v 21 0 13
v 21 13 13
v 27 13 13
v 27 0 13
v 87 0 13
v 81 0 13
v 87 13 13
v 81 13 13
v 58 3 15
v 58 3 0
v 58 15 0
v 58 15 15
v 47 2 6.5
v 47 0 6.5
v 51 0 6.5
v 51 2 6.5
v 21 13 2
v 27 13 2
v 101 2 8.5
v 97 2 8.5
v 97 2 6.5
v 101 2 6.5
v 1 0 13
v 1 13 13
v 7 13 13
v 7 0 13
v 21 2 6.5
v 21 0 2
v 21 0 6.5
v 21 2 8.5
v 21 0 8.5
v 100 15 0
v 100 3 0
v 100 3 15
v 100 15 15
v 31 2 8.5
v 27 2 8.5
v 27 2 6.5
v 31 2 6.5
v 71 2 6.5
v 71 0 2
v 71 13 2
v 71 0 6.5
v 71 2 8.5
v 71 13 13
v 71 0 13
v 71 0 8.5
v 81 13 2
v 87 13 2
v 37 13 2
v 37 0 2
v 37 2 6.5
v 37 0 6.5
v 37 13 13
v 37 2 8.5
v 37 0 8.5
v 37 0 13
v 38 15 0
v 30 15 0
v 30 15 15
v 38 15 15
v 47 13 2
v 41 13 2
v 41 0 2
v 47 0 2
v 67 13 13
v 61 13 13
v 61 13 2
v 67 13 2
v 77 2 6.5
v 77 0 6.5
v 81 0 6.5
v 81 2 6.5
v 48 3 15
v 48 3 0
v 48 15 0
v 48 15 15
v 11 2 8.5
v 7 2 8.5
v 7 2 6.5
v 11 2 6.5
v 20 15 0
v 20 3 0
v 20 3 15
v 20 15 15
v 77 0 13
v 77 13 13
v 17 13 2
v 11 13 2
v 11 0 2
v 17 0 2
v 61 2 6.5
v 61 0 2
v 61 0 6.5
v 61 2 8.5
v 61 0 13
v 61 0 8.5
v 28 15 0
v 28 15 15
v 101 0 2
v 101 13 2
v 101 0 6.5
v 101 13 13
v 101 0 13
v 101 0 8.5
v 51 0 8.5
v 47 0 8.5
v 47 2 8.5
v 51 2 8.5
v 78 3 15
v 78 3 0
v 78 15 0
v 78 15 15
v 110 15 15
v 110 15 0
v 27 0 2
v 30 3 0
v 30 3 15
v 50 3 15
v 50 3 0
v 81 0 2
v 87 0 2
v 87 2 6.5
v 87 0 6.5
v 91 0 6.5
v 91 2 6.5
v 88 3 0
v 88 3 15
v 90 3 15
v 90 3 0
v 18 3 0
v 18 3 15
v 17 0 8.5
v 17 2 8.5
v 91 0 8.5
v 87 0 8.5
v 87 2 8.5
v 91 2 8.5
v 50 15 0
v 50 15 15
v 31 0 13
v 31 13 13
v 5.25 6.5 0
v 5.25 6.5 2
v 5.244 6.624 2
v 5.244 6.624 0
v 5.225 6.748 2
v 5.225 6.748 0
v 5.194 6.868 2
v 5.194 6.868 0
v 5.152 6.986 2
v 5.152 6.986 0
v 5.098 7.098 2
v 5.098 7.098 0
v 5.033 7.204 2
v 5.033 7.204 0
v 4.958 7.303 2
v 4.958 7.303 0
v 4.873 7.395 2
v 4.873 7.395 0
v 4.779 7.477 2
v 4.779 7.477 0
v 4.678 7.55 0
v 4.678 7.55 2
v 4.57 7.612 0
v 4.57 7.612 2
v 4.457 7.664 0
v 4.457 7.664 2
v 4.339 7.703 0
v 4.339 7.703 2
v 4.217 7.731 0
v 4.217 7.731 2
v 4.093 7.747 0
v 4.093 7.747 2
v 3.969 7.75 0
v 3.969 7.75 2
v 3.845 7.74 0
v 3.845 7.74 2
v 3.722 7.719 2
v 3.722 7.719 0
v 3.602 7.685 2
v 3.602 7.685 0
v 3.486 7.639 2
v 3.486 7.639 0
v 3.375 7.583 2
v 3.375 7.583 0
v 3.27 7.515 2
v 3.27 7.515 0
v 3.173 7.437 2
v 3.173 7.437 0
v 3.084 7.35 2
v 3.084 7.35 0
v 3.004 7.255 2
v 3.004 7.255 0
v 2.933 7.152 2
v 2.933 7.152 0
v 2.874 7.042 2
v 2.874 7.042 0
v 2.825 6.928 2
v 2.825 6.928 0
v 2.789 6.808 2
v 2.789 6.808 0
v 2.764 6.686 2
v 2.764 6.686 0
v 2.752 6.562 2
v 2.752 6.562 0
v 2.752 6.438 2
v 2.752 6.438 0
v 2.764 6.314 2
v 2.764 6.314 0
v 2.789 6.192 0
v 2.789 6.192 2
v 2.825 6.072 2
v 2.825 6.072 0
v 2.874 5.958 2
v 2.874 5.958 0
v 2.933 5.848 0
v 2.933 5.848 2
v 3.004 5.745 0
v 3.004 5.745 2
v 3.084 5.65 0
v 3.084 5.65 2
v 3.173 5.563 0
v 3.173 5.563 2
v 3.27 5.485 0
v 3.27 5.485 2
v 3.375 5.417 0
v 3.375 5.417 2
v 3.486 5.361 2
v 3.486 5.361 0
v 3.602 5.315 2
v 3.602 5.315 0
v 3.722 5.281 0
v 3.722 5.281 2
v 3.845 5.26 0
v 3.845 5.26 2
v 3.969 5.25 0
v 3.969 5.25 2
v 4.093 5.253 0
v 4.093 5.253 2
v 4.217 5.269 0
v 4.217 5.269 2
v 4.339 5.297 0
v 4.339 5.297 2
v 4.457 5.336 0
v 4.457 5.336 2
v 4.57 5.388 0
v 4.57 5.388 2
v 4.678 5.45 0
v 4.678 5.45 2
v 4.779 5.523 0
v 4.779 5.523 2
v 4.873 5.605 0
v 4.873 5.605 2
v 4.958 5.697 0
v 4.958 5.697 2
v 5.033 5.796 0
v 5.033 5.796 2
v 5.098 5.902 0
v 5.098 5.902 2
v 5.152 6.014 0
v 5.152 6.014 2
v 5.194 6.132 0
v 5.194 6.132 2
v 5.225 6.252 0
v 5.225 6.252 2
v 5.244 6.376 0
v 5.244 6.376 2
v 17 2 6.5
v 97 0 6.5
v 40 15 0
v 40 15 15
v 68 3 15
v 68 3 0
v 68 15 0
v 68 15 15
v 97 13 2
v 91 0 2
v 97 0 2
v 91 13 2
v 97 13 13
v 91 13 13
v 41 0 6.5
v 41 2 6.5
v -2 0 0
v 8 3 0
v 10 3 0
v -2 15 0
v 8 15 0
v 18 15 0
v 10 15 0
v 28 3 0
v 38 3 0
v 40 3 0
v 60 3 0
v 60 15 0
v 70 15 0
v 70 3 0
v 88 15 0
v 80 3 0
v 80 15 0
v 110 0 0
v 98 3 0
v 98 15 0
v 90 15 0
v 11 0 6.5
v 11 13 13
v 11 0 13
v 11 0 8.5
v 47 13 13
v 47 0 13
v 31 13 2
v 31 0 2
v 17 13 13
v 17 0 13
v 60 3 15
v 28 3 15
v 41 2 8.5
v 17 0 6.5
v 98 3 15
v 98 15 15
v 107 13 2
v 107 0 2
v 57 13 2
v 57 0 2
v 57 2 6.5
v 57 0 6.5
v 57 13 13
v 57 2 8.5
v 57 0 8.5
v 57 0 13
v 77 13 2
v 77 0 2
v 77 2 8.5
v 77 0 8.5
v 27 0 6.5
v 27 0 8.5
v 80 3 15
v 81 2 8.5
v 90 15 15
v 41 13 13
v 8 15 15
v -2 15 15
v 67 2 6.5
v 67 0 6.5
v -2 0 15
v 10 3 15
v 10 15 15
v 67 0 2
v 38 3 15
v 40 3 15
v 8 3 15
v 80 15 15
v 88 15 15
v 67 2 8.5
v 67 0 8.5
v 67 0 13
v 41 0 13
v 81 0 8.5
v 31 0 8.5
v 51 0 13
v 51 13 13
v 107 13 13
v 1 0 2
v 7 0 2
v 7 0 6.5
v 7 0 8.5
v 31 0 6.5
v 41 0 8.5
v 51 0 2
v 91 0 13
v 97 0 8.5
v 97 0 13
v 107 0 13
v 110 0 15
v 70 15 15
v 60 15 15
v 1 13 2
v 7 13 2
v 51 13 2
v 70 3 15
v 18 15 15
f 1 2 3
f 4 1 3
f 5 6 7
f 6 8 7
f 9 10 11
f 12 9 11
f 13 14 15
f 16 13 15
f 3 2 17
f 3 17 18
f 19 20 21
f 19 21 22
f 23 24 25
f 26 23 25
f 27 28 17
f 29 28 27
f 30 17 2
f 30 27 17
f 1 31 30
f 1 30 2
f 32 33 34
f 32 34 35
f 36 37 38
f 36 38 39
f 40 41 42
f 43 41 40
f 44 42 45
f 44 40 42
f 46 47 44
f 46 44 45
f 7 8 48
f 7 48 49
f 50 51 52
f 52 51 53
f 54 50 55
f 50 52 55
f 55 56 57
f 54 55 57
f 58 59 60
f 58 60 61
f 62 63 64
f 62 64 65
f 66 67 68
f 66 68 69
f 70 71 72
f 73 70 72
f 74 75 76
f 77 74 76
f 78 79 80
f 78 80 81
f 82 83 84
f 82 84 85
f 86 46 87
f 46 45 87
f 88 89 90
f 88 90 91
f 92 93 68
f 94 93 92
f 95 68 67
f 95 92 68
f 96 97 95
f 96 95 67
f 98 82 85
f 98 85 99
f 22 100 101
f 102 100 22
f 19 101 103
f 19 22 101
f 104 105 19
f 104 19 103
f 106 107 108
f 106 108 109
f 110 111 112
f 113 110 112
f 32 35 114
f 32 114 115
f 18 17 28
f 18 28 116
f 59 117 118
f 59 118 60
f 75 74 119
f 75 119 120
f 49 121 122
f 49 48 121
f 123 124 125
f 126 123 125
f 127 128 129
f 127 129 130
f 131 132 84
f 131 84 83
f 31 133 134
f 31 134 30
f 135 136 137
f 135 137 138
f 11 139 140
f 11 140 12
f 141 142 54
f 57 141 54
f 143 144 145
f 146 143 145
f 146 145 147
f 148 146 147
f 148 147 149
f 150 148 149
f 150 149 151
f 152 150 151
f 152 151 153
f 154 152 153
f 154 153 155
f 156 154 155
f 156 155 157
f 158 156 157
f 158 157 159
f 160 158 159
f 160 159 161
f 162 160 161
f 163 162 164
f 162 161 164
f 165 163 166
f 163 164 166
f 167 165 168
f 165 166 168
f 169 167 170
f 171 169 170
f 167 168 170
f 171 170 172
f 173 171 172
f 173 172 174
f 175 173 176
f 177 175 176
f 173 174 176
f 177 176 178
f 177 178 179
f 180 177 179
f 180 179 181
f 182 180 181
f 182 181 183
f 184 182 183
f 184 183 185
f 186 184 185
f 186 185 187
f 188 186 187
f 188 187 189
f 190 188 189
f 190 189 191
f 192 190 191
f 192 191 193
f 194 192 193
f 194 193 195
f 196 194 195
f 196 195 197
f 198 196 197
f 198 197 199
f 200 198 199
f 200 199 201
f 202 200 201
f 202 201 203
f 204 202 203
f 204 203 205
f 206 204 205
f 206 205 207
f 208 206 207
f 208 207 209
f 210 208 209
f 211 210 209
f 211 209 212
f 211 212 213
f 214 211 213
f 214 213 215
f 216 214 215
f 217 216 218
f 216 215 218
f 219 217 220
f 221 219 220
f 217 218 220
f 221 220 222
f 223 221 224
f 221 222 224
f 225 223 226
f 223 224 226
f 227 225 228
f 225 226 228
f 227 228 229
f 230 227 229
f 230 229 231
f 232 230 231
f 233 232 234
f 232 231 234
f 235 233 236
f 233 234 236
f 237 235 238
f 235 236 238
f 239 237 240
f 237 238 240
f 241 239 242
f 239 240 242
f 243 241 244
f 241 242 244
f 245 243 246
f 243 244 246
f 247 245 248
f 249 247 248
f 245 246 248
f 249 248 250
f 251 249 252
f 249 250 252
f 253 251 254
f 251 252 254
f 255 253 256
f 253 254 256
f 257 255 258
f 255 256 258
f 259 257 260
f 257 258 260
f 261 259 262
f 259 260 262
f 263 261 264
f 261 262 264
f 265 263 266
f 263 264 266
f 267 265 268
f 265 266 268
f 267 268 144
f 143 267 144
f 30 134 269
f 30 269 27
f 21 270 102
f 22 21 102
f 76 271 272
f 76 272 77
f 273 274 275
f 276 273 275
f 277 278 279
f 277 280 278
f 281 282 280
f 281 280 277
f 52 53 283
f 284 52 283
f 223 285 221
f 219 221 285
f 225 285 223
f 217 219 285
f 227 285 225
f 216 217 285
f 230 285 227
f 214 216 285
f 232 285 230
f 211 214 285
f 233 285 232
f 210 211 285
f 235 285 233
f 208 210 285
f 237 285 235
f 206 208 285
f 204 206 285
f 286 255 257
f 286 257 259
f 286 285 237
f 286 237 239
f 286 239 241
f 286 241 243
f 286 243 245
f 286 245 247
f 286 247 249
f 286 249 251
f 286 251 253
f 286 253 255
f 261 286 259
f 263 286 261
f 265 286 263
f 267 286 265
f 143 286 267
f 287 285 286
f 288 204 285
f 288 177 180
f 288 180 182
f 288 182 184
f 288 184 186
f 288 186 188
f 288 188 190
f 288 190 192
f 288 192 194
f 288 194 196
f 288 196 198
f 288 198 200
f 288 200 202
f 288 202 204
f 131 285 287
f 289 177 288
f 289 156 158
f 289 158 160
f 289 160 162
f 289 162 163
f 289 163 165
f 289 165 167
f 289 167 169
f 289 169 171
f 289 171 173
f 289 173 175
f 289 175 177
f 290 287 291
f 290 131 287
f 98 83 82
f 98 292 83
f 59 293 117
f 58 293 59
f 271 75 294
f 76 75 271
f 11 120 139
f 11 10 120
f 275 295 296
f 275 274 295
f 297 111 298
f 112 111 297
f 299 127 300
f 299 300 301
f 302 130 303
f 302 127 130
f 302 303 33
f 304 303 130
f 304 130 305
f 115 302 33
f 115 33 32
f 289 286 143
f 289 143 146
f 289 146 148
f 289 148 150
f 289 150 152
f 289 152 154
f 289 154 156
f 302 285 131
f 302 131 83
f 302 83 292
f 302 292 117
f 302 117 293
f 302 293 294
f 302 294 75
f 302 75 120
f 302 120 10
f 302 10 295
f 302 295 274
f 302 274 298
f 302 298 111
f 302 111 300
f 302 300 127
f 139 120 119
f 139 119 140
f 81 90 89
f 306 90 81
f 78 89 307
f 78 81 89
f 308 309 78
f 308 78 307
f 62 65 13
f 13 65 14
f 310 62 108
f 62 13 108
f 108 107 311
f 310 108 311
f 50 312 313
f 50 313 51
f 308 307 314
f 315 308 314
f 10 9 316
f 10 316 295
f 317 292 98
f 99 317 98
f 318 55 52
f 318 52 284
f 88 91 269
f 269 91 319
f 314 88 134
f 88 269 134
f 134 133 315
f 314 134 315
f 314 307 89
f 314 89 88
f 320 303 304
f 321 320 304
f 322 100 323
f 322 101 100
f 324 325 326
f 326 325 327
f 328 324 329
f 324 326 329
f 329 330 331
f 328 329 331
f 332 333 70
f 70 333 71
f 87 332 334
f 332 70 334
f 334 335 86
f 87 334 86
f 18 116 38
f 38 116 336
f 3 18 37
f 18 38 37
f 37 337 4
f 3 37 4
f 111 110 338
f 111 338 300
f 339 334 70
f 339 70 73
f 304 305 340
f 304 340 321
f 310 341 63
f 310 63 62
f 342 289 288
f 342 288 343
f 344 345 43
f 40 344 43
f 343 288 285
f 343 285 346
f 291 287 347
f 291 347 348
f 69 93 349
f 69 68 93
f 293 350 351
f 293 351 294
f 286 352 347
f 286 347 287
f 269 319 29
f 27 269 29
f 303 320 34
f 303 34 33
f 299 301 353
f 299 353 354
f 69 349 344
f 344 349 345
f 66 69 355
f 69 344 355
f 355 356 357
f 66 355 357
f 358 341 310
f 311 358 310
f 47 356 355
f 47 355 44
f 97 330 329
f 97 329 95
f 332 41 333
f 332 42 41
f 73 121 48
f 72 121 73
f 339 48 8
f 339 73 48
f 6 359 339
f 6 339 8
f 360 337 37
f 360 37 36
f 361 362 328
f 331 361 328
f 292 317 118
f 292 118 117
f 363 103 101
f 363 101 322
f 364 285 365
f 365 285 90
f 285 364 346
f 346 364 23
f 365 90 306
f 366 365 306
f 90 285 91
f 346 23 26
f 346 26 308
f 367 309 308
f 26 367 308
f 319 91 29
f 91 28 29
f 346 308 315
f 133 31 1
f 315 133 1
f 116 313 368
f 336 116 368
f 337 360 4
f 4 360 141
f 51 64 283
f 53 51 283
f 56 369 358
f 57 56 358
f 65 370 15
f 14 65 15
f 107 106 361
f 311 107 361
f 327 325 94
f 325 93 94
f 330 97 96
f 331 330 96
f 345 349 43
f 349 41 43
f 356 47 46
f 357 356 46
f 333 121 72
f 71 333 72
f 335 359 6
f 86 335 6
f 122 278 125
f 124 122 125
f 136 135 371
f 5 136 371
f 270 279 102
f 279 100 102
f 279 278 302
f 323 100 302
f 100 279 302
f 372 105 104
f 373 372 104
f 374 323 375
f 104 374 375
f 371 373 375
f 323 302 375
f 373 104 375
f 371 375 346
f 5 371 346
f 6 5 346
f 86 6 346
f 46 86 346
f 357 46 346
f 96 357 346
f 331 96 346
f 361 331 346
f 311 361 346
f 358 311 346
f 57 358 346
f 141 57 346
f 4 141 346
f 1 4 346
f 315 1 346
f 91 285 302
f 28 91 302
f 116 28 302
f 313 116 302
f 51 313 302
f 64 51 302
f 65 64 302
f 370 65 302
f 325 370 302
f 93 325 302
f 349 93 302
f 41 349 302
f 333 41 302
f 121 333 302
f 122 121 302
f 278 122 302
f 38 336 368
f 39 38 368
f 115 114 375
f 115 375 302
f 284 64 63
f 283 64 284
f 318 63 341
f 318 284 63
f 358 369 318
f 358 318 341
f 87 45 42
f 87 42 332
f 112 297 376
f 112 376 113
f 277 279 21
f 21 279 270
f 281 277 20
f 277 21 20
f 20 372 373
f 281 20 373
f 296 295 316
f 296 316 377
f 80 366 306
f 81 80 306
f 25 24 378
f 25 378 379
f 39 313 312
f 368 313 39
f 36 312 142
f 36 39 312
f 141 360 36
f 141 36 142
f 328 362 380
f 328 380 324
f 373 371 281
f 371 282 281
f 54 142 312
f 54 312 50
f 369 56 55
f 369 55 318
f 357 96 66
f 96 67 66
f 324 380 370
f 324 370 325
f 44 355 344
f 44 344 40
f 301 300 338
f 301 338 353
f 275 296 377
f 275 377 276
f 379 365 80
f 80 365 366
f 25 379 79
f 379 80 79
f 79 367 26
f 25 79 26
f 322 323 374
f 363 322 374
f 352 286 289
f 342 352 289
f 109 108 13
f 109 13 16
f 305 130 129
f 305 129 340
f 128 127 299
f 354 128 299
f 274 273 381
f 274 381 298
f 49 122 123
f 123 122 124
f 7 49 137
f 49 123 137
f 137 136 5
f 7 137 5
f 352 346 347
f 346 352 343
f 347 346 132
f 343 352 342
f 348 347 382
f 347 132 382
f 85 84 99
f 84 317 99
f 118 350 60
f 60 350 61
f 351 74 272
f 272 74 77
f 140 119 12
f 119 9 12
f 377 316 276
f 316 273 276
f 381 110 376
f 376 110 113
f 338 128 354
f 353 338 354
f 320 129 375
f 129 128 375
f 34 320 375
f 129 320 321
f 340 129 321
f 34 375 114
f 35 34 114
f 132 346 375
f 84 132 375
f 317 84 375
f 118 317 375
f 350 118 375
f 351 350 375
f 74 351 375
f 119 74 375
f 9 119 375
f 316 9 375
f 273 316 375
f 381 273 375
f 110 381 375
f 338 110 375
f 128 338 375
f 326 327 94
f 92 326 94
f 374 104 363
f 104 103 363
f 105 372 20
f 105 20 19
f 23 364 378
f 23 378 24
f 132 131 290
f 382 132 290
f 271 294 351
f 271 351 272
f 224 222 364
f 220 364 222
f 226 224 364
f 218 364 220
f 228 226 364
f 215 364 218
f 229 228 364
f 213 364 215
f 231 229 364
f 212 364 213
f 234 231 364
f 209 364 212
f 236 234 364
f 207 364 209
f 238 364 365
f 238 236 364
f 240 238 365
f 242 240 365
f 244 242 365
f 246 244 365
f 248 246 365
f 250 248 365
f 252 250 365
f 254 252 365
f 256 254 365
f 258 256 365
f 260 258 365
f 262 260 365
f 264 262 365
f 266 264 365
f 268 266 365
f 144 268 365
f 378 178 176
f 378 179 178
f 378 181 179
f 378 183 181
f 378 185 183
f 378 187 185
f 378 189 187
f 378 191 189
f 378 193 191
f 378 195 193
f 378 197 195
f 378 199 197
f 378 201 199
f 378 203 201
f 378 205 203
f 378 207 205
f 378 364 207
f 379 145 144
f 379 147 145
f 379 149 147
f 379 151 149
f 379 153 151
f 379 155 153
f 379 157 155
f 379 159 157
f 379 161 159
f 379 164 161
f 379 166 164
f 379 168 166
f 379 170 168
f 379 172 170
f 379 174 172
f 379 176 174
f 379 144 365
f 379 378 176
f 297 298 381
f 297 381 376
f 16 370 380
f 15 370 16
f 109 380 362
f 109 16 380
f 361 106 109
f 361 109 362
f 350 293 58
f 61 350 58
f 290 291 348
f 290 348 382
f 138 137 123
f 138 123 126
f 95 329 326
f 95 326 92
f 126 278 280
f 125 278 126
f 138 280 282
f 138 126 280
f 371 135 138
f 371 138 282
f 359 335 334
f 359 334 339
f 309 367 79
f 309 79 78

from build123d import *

# Parameters (mm, degrees)
SKETCH1_W                       = 8
SKETCH1_H                       = 15
FIRST_CHAMBER_BLOCK_DEPTH       = 15
SKETCH2_W                       = 6
SKETCH2_H                       = 11
FIRST_CHAMBER_CAVITY_DEPTH      = 13
SKETCH3_W                       = 15
SKETCH3_H                       = 3
CHAMBER_SPACER_DEPTH            = 2
PATTERN_CHAMBERS_COUNT          = 11
PATTERN_CHAMBERS_PITCH          = 10
SKETCH4_W                       = 15
SKETCH4_H                       = 12
THICKEN_END_1_DEPTH             = 2
SKETCH5_W                       = 15
SKETCH5_H                       = 15
THICKEN_END_2_DEPTH             = 2
SKETCH6_W                       = 94
SKETCH6_H                       = 2
CENTRAL_AIR_CHANNEL_DEPTH       = 2
SKETCH7_W                       = 108
SKETCH7_H                       = 13
SKETCH7_W_2                     = 106
SKETCH7_H_2                     = 11
BONDING_RIDGE_DEPTH             = 2
SKETCH9_W                       = 2
SKETCH9_H                       = 2.5
BONDING_BUMPS_DEPTH             = 2
PATTERN_BONDING_BUMPS_COUNT     = 10
PATTERN_BONDING_BUMPS_PITCH     = 10
SKIZZE1_W                       = 112
SKIZZE1_H                       = 15
SCHNITT_LINEAR_AUSTRAGEN1_DEPTH = 113.026782512
SKIZZE4_R                       = 1.25
SCHNITT_LINEAR_AUSTRAGEN3_DEPTH = 112.776562839


with BuildPart() as part:
    # Sketch1 → first chamber block (new body)
    with BuildSketch(Plane.XY):
        with Locations((4, 7.5)):
            Rectangle(SKETCH1_W, SKETCH1_H)
    extrude(amount=FIRST_CHAMBER_BLOCK_DEPTH)

    # Sketch2 → first chamber cavity (cut)
    with BuildSketch(Plane.XZ):
        with Locations((4, 7.5)):
            Rectangle(SKETCH2_W, SKETCH2_H)
    extrude(amount=-FIRST_CHAMBER_CAVITY_DEPTH, mode=Mode.SUBTRACT)

    # Sketch3 → chamber spacer (add)
    with BuildSketch(Plane(origin=(8, 0, 0), x_dir=(0, 0, -1), z_dir=(1, 0, 0))):
        with Locations((-7.5, 1.5)):
            Rectangle(SKETCH3_W, SKETCH3_H)
    extrude(amount=CHAMBER_SPACER_DEPTH)


with BuildPart() as pattern_chambers_1:
    # pattern chambers: pattern copy
    add(part.part.moved(Location(Vector(1, 0, 0) * (1 * PATTERN_CHAMBERS_PITCH))))


with BuildPart() as pattern_chambers_2:
    # pattern chambers: pattern copy
    add(part.part.moved(Location(Vector(1, 0, 0) * (2 * PATTERN_CHAMBERS_PITCH))))


with BuildPart() as pattern_chambers_3:
    # pattern chambers: pattern copy
    add(part.part.moved(Location(Vector(1, 0, 0) * (3 * PATTERN_CHAMBERS_PITCH))))


with BuildPart() as pattern_chambers_4:
    # pattern chambers: pattern copy
    add(part.part.moved(Location(Vector(1, 0, 0) * (4 * PATTERN_CHAMBERS_PITCH))))


with BuildPart() as pattern_chambers_5:
    # pattern chambers: pattern copy
    add(part.part.moved(Location(Vector(1, 0, 0) * (5 * PATTERN_CHAMBERS_PITCH))))


with BuildPart() as pattern_chambers_6:
    # pattern chambers: pattern copy
    add(part.part.moved(Location(Vector(1, 0, 0) * (6 * PATTERN_CHAMBERS_PITCH))))


with BuildPart() as pattern_chambers_7:
    # pattern chambers: pattern copy
    add(part.part.moved(Location(Vector(1, 0, 0) * (7 * PATTERN_CHAMBERS_PITCH))))


with BuildPart() as pattern_chambers_8:
    # pattern chambers: pattern copy
    add(part.part.moved(Location(Vector(1, 0, 0) * (8 * PATTERN_CHAMBERS_PITCH))))


with BuildPart() as pattern_chambers_9:
    # pattern chambers: pattern copy
    add(part.part.moved(Location(Vector(1, 0, 0) * (9 * PATTERN_CHAMBERS_PITCH))))


with BuildPart() as pattern_chambers_10:
    # pattern chambers: pattern copy
    add(part.part.moved(Location(Vector(1, 0, 0) * (10 * PATTERN_CHAMBERS_PITCH))))

    # combine into 1 solid body: union pattern chambers_9, pattern chambers_8, pattern chambers_7, pattern chambers_6, pattern chambers_5, pattern chambers_4, pattern chambers_3, pattern chambers_2, pattern chambers_1, part
    add(pattern_chambers_9.part)
    add(pattern_chambers_8.part)
    add(pattern_chambers_7.part)
    add(pattern_chambers_6.part)
    add(pattern_chambers_5.part)
    add(pattern_chambers_4.part)
    add(pattern_chambers_3.part)
    add(pattern_chambers_2.part)
    add(pattern_chambers_1.part)
    add(part.part)

    # Sketch4 → thicken end 1 (add)
    with BuildSketch(Plane(origin=(108, 0, 0), x_dir=(0, 0, -1), z_dir=(1, 0, 0))):
        with Locations((-7.5, 9)):
            Rectangle(SKETCH4_W, SKETCH4_H)
    extrude(amount=THICKEN_END_1_DEPTH)

    # Sketch5 → thicken end 2 (add)
    with BuildSketch(Plane.ZY):
        with Locations((7.5, 7.5)):
            Rectangle(SKETCH5_W, SKETCH5_H)
    extrude(amount=THICKEN_END_2_DEPTH)

    # Sketch6 → central air channel (cut)
    with BuildSketch(Plane.XZ):
        with Locations((54, 7.5)):
            Rectangle(SKETCH6_W, SKETCH6_H)
    extrude(amount=-CENTRAL_AIR_CHANNEL_DEPTH, mode=Mode.SUBTRACT)

    # Sketch7 → bonding ridge (add)
    with BuildSketch(Plane.XZ):
        with Locations((54, 7.5)):
            Rectangle(SKETCH7_W, SKETCH7_H)
        with Locations((54, 7.5)):
            Rectangle(SKETCH7_W_2, SKETCH7_H_2, mode=Mode.SUBTRACT)
    extrude(amount=BONDING_RIDGE_DEPTH)

    # Sketch9 → bonding bumps (add)
    with BuildSketch(Plane.XZ):
        with Locations((9, 10.75)):
            Rectangle(SKETCH9_W, SKETCH9_H)
        with Locations((9, 4.25)):
            Rectangle(SKETCH9_W, SKETCH9_H)
    bonding_bumps = extrude(amount=BONDING_BUMPS_DEPTH)

    # pattern bonding bumps: bonding bumps ×10
    with Locations(*[(i * PATTERN_BONDING_BUMPS_PITCH, 0, 0) for i in range(1, PATTERN_BONDING_BUMPS_COUNT)]):
        add(bonding_bumps)

    # Skizze1 → Schnitt-Linear austragen1 (cut, through all)
    with BuildSketch(Plane.XZ):
        with Locations((54, 7.5)):
            Rectangle(SKIZZE1_W, SKIZZE1_H)
    extrude(amount=SCHNITT_LINEAR_AUSTRAGEN1_DEPTH, mode=Mode.SUBTRACT)

    # Skizze4 → Schnitt-Linear austragen3 (cut, through all)
    with BuildSketch(Plane.XY.offset(2)):
        with Locations((4, 6.5)):
            Circle(SKIZZE4_R)
    extrude(amount=-SCHNITT_LINEAR_AUSTRAGEN3_DEPTH, mode=Mode.SUBTRACT)


solid = pattern_chambers_10.part
